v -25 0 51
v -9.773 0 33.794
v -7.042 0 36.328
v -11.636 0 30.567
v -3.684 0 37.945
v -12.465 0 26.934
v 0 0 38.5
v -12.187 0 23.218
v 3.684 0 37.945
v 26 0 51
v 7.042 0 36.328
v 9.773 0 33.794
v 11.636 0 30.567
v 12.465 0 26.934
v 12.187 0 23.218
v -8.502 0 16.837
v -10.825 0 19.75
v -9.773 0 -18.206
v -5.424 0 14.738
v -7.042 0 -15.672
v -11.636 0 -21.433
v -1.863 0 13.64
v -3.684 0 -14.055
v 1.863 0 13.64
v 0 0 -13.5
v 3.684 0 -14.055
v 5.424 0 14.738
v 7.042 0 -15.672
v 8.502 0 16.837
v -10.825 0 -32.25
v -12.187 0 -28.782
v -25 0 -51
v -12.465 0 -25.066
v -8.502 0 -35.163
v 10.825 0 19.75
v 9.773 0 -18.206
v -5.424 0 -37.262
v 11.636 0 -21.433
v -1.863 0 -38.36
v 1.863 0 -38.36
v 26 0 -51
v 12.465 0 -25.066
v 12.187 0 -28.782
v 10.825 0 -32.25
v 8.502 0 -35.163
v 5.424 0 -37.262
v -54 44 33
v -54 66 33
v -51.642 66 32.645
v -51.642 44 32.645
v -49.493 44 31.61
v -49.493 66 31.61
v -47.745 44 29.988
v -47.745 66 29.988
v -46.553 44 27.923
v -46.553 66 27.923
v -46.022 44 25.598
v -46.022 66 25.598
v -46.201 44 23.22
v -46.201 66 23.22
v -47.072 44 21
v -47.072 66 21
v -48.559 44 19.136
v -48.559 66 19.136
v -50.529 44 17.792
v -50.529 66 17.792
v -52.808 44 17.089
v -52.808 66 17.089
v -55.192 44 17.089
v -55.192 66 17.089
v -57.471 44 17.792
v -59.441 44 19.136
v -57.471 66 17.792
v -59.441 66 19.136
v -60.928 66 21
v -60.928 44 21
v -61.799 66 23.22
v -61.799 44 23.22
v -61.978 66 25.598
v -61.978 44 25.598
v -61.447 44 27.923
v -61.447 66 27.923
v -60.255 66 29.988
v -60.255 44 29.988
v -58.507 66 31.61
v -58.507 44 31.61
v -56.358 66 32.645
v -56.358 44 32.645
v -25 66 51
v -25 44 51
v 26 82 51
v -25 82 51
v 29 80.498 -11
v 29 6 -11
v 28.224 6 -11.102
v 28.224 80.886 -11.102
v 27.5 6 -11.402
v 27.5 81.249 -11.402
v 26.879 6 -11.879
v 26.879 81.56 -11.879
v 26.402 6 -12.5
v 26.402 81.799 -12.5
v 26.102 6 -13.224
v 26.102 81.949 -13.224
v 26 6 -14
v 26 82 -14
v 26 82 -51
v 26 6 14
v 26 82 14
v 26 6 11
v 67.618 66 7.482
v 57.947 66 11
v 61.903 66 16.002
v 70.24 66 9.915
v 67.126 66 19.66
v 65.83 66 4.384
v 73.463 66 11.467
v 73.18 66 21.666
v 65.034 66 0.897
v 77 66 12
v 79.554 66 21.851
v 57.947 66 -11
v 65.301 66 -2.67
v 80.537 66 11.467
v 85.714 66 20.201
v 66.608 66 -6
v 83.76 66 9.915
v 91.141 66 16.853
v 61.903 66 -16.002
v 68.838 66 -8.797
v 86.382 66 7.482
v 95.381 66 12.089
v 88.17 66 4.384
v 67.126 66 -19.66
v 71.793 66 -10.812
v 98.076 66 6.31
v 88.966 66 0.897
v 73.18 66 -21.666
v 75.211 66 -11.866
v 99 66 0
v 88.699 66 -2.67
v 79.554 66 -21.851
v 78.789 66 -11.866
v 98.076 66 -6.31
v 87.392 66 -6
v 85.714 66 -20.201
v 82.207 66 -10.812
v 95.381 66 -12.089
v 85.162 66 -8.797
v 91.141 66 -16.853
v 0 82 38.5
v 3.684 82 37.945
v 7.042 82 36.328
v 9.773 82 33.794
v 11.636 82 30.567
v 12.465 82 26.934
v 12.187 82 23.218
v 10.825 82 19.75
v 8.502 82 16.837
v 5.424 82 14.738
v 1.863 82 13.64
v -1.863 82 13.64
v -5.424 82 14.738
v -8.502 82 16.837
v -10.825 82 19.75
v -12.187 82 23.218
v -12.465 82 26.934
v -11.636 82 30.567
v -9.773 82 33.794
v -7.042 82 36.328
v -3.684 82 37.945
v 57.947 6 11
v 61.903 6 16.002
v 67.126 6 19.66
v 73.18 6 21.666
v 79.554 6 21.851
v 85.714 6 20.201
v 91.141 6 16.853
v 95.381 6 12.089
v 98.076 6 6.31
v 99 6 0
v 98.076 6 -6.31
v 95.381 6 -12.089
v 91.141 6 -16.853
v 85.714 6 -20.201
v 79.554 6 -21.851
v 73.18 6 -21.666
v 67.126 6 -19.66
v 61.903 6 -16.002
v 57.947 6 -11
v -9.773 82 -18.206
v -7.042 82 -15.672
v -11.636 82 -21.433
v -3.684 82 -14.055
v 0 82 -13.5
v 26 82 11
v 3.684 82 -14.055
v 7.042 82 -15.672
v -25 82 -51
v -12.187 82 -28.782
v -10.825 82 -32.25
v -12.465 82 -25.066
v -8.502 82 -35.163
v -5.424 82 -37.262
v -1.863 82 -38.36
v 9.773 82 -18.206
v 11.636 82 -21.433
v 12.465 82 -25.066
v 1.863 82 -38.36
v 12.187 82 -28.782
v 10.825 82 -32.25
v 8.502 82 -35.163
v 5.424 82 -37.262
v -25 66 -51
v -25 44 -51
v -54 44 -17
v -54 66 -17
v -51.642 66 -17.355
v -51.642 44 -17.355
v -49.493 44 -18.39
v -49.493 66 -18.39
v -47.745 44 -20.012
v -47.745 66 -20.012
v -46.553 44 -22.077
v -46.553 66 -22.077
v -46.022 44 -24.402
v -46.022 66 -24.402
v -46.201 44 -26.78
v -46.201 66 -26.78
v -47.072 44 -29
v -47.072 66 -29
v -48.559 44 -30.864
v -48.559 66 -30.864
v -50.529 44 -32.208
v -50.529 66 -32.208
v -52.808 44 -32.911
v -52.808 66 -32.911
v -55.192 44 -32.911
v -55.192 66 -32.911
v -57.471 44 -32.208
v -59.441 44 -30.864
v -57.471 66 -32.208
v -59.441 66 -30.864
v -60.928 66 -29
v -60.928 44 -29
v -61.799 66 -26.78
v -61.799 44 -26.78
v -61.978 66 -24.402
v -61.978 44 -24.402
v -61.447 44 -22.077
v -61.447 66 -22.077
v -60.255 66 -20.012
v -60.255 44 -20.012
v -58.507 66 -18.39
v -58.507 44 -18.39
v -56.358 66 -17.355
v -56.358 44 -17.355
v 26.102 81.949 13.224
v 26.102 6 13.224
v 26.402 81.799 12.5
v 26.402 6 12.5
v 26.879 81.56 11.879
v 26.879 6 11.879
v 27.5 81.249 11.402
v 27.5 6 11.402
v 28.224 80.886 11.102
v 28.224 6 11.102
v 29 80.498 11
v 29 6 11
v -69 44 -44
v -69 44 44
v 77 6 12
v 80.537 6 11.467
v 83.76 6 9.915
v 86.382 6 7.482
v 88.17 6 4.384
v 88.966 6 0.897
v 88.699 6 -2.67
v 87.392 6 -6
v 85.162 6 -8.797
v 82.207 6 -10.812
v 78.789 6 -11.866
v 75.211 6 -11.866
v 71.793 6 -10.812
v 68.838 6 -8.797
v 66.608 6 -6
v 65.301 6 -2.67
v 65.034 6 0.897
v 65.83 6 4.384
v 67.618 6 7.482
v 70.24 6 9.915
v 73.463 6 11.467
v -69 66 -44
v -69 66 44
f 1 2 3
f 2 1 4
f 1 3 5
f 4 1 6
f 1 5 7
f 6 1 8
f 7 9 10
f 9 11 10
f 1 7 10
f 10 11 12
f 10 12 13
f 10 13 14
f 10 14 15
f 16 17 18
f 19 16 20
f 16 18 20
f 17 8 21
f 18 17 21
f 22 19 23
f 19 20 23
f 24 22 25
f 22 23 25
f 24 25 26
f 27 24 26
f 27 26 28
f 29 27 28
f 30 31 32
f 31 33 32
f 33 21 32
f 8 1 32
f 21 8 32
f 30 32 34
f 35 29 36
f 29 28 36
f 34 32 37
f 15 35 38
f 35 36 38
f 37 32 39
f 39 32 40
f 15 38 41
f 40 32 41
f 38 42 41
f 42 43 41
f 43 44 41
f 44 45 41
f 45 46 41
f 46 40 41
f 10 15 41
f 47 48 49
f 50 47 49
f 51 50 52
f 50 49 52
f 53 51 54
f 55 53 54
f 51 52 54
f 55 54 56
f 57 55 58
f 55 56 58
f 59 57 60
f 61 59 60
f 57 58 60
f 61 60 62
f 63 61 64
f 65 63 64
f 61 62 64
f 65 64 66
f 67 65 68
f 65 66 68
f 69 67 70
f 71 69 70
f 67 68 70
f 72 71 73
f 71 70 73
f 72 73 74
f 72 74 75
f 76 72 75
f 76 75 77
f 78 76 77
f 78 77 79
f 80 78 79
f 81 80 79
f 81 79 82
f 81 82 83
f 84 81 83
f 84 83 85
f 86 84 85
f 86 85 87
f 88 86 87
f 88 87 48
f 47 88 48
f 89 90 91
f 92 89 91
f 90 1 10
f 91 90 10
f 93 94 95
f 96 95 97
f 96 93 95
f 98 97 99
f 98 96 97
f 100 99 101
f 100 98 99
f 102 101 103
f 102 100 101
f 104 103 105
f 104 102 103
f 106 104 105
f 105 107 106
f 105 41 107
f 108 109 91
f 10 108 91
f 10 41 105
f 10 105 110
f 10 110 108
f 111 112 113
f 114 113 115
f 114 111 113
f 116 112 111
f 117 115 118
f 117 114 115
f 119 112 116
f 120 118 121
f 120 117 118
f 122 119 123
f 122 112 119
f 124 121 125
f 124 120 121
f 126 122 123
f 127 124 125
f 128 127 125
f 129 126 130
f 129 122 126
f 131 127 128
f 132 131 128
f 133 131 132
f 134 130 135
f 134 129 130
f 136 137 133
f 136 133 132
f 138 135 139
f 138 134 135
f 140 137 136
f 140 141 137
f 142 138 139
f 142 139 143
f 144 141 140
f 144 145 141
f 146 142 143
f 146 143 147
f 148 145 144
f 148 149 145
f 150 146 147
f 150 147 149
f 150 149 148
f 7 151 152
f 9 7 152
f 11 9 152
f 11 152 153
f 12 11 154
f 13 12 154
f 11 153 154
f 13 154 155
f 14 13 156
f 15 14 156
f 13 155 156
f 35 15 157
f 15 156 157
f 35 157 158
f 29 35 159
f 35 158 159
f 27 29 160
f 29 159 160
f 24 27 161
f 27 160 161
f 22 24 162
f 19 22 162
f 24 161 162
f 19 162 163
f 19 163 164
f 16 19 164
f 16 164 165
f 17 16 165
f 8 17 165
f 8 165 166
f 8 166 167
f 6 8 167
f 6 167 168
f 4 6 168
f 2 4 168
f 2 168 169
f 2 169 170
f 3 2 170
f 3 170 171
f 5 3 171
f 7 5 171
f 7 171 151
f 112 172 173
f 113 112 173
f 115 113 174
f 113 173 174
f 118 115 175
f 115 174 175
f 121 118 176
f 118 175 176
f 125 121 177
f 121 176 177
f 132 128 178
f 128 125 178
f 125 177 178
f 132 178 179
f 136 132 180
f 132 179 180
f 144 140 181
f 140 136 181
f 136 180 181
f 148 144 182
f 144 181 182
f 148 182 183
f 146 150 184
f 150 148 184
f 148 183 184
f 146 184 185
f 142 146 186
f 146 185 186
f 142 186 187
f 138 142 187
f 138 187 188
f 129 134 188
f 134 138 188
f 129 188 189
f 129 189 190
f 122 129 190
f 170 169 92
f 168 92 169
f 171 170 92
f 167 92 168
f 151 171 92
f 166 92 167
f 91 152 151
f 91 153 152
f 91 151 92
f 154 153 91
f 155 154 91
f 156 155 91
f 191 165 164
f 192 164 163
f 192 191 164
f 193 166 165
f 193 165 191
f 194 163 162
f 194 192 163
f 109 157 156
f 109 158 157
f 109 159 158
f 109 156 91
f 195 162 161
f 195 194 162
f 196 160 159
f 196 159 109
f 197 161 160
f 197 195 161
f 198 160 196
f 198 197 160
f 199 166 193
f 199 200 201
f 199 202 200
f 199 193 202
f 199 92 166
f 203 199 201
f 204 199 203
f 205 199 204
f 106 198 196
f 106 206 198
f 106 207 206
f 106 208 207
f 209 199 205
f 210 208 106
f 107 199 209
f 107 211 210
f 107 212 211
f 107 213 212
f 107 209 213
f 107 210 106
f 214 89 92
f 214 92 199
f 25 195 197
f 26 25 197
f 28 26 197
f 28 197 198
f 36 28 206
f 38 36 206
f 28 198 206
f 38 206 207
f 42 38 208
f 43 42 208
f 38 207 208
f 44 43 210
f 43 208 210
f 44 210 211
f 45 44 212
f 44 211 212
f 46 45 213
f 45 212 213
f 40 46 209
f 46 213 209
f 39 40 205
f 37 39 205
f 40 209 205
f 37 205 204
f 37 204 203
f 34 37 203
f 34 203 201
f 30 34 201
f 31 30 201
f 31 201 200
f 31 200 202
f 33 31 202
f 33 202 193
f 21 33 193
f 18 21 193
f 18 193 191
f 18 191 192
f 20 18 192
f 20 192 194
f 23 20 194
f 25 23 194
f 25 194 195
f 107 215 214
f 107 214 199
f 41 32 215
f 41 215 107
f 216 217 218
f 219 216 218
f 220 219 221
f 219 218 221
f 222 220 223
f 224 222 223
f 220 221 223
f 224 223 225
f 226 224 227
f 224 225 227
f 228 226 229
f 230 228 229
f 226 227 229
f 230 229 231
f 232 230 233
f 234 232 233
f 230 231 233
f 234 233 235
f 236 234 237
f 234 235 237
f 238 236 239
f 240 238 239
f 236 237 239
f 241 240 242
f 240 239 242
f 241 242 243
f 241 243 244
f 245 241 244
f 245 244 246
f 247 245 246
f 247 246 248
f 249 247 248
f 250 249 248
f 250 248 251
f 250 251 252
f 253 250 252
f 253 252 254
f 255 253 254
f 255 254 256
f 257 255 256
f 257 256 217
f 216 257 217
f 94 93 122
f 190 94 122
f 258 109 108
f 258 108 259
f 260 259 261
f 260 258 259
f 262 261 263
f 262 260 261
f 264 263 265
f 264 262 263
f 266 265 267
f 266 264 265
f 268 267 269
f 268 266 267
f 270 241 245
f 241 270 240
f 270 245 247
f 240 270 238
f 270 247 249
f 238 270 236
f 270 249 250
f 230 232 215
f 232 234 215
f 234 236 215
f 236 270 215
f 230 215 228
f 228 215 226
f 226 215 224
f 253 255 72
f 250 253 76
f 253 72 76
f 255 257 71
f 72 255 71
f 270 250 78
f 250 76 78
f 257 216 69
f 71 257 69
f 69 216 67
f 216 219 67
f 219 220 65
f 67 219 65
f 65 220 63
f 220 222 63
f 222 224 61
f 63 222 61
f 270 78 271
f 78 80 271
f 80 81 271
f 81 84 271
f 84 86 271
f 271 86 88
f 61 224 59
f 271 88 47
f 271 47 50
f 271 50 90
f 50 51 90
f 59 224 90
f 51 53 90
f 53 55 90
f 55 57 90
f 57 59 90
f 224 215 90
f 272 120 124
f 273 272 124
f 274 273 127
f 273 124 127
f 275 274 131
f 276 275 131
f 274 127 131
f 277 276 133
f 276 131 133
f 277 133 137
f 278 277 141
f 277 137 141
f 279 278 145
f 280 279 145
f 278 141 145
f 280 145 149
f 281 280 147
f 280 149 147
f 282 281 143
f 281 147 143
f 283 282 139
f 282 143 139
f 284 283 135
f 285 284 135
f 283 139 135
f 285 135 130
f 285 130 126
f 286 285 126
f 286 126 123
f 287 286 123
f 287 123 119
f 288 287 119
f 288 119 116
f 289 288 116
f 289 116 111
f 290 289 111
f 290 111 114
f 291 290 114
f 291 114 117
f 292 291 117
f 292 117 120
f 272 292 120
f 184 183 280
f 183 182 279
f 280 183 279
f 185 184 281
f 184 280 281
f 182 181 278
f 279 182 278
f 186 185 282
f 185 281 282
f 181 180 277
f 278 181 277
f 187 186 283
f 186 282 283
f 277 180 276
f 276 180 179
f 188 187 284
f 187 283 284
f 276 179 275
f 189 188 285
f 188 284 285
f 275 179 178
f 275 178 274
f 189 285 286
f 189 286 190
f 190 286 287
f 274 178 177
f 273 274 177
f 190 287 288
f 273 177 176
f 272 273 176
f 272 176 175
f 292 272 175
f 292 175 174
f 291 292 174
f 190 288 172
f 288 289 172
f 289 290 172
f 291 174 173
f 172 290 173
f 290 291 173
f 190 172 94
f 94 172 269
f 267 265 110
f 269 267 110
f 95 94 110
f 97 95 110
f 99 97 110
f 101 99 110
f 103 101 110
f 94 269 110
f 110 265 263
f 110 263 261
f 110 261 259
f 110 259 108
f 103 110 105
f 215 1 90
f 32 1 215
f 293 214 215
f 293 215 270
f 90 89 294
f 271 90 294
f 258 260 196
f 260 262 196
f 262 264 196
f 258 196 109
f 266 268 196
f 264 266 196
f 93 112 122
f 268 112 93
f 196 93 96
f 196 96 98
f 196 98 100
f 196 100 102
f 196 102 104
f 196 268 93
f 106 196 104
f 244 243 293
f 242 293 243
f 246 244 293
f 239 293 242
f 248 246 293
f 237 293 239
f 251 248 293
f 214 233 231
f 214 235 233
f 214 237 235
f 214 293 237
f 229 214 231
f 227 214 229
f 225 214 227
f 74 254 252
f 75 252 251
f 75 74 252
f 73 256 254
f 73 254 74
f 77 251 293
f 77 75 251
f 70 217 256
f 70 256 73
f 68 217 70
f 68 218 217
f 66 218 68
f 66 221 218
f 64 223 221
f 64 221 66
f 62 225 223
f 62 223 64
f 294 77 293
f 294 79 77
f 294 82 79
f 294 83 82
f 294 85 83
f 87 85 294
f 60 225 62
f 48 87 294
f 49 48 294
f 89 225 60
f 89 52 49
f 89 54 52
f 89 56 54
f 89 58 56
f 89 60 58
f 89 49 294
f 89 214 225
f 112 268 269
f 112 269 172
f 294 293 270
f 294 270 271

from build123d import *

# Parameters (mm, degrees)
SCHIZZO1_R                   = 22
SCHIZZO1_W                   = 51
SCHIZZO1_H                   = 102
SCHIZZO1_W_2                 = 31.947441117
SCHIZZO1_H_2                 = 22
ESTRUSIONE_ESTRUSIONE2_DEPTH = 82
SCHIZZO2_W                   = 80.086203662
SCHIZZO2_H                   = 68.356722048
TAGLIO_ESTRUSIONE1_DEPTH     = 6
SCHIZZO3_W                   = 81.899638904
SCHIZZO3_H                   = 77.244744974
TAGLIO_ESTRUSIONE4_DEPTH     = 16
ESTRUSIONE_ESTRUSIONE3_DEPTH = 22
SCHIZZO6_W                   = 102
SCHIZZO6_H                   = 22
ESTRUSIONE_ESTRUSIONE4_DEPTH = 44
SCHIZZO7_R                   = 8
TAGLIO_ESTRUSIONE5_DEPTH     = 130.452694062
SCHIZZO8_R                   = 12.5
TAGLIO_ESTRUSIONE6_DEPTH     = 139.29678232
SCHIZZO9_R                   = 12
TAGLIO_ESTRUSIONE7_DEPTH     = 130.452694062
RACCORDO1_R                  = 3
RACCORDO2_R                  = 3


with BuildPart() as part:
    # Schizzo1 → Estrusione-Estrusione2 (new body)
    with BuildSketch(Plane(origin=(0, 0, 0), x_dir=(1, 0, 0), z_dir=(0, 1, 0))):
        with Locations((77, 0)):
            Circle(SCHIZZO1_R)
        with Locations((0.5, 0)):
            Rectangle(SCHIZZO1_W, SCHIZZO1_H)
        with Locations((41.973720559, 0)):
            Rectangle(SCHIZZO1_W_2, SCHIZZO1_H_2)
    extrude(amount=ESTRUSIONE_ESTRUSIONE2_DEPTH)

    # Schizzo2 → Taglio-Estrusione1 (cut)
    with BuildSketch(Plane.XZ):
        with Locations((66.043101831, -4.044394055)):
            Rectangle(SCHIZZO2_W, SCHIZZO2_H)
    extrude(amount=-TAGLIO_ESTRUSIONE1_DEPTH, mode=Mode.SUBTRACT)

    # Schizzo3 → Taglio-Estrusione4 (cut)
    with BuildSketch(Plane(origin=(0, 82, 0), x_dir=(1, 0, 0), z_dir=(0, 1, 0))):
        with Locations((66.949819452, -1.56539862)):
            Rectangle(SCHIZZO3_W, SCHIZZO3_H)
    extrude(amount=-TAGLIO_ESTRUSIONE4_DEPTH, mode=Mode.SUBTRACT)

    # Schizzo5 → Estrusione-Estrusione3 (add)
    with BuildSketch(Plane.XY.offset(11)):
        Polygon((57.947441117, 66), (26, 82), (26, 66), align=None)
    extrude(amount=-ESTRUSIONE_ESTRUSIONE3_DEPTH)

    # Schizzo6 → Estrusione-Estrusione4 (add)
    with BuildSketch(Plane.ZY.offset(25)):
        with Locations((0, 55)):
            Rectangle(SCHIZZO6_W, SCHIZZO6_H)
    extrude(amount=ESTRUSIONE_ESTRUSIONE4_DEPTH)

    # Schizzo7 → Taglio-Estrusione5 (cut, through all)
    with BuildSketch(Plane(origin=(0, 66, 0), x_dir=(1, 0, 0), z_dir=(0, 1, 0))):
        with Locations(Location((-54, -25, 0), (0, 0, 270))):
            Circle(SCHIZZO7_R)
        with Locations(Location((-54, 25, 0), (0, 0, 270))):
            Circle(SCHIZZO7_R)
        Polygon((-25, -51), (-69, -44), (-69, -51), align=None)
        Polygon((-25, 51), (-69, 44), (-69, 51), align=None)
    extrude(amount=-TAGLIO_ESTRUSIONE5_DEPTH, mode=Mode.SUBTRACT)

    # Schizzo8 → Taglio-Estrusione6 (cut, through all)
    with BuildSketch(Plane(origin=(0, 82, 0), x_dir=(1, 0, 0), z_dir=(0, 1, 0))):
        with Locations(Location((0, -26, 0), (0, 0, 270))):
            Circle(SCHIZZO8_R)
        with Locations(Location((0, 26, 0), (0, 0, 270))):
            Circle(SCHIZZO8_R)
    extrude(amount=-TAGLIO_ESTRUSIONE6_DEPTH, mode=Mode.SUBTRACT)

    # Schizzo9 → Taglio-Estrusione7 (cut, through all)
    with BuildSketch(Plane(origin=(0, 66, 0), x_dir=(1, 0, 0), z_dir=(0, 1, 0))):
        with Locations(Location((77, 0, 0), (0, 0, 270))):
            Circle(SCHIZZO9_R)
    extrude(amount=-TAGLIO_ESTRUSIONE7_DEPTH, mode=Mode.SUBTRACT)

    # Raccordo1
    raccordo1_edges = [part.edges().sort_by_distance(p)[0] for p in [
        (26, 44, -11),
    ]]
    fillet(raccordo1_edges, radius=RACCORDO1_R)

    # Raccordo2
    # the kernel refuses this fillet: 3 mm, written as the material it adds along each edge
    with BuildSketch(Plane(origin=(26, 82, 11), x_dir=(1, 0, 0), z_dir=(0, -1, 0))) as raccordo2_piece_1_section:
        with BuildLine():
            CenterArc((RACCORDO2_R, RACCORDO2_R), RACCORDO2_R, 180, 90)
            Line((0, RACCORDO2_R), (0, 0))
            Line((0, 0), (RACCORDO2_R, 0))
        make_face()
    raccordo2_piece_1 = extrude(amount=76, mode=Mode.PRIVATE)
    raccordo2_piece_1 = split(raccordo2_piece_1, bisect_by=Plane(origin=(41.823834569, 74.075066289, 11.680808527), z_dir=(-0.44780189792218816, -0.8941327978646608, 0)), keep=Keep.TOP, mode=Mode.PRIVATE)
    add(raccordo2_piece_1)


solid = part.part
